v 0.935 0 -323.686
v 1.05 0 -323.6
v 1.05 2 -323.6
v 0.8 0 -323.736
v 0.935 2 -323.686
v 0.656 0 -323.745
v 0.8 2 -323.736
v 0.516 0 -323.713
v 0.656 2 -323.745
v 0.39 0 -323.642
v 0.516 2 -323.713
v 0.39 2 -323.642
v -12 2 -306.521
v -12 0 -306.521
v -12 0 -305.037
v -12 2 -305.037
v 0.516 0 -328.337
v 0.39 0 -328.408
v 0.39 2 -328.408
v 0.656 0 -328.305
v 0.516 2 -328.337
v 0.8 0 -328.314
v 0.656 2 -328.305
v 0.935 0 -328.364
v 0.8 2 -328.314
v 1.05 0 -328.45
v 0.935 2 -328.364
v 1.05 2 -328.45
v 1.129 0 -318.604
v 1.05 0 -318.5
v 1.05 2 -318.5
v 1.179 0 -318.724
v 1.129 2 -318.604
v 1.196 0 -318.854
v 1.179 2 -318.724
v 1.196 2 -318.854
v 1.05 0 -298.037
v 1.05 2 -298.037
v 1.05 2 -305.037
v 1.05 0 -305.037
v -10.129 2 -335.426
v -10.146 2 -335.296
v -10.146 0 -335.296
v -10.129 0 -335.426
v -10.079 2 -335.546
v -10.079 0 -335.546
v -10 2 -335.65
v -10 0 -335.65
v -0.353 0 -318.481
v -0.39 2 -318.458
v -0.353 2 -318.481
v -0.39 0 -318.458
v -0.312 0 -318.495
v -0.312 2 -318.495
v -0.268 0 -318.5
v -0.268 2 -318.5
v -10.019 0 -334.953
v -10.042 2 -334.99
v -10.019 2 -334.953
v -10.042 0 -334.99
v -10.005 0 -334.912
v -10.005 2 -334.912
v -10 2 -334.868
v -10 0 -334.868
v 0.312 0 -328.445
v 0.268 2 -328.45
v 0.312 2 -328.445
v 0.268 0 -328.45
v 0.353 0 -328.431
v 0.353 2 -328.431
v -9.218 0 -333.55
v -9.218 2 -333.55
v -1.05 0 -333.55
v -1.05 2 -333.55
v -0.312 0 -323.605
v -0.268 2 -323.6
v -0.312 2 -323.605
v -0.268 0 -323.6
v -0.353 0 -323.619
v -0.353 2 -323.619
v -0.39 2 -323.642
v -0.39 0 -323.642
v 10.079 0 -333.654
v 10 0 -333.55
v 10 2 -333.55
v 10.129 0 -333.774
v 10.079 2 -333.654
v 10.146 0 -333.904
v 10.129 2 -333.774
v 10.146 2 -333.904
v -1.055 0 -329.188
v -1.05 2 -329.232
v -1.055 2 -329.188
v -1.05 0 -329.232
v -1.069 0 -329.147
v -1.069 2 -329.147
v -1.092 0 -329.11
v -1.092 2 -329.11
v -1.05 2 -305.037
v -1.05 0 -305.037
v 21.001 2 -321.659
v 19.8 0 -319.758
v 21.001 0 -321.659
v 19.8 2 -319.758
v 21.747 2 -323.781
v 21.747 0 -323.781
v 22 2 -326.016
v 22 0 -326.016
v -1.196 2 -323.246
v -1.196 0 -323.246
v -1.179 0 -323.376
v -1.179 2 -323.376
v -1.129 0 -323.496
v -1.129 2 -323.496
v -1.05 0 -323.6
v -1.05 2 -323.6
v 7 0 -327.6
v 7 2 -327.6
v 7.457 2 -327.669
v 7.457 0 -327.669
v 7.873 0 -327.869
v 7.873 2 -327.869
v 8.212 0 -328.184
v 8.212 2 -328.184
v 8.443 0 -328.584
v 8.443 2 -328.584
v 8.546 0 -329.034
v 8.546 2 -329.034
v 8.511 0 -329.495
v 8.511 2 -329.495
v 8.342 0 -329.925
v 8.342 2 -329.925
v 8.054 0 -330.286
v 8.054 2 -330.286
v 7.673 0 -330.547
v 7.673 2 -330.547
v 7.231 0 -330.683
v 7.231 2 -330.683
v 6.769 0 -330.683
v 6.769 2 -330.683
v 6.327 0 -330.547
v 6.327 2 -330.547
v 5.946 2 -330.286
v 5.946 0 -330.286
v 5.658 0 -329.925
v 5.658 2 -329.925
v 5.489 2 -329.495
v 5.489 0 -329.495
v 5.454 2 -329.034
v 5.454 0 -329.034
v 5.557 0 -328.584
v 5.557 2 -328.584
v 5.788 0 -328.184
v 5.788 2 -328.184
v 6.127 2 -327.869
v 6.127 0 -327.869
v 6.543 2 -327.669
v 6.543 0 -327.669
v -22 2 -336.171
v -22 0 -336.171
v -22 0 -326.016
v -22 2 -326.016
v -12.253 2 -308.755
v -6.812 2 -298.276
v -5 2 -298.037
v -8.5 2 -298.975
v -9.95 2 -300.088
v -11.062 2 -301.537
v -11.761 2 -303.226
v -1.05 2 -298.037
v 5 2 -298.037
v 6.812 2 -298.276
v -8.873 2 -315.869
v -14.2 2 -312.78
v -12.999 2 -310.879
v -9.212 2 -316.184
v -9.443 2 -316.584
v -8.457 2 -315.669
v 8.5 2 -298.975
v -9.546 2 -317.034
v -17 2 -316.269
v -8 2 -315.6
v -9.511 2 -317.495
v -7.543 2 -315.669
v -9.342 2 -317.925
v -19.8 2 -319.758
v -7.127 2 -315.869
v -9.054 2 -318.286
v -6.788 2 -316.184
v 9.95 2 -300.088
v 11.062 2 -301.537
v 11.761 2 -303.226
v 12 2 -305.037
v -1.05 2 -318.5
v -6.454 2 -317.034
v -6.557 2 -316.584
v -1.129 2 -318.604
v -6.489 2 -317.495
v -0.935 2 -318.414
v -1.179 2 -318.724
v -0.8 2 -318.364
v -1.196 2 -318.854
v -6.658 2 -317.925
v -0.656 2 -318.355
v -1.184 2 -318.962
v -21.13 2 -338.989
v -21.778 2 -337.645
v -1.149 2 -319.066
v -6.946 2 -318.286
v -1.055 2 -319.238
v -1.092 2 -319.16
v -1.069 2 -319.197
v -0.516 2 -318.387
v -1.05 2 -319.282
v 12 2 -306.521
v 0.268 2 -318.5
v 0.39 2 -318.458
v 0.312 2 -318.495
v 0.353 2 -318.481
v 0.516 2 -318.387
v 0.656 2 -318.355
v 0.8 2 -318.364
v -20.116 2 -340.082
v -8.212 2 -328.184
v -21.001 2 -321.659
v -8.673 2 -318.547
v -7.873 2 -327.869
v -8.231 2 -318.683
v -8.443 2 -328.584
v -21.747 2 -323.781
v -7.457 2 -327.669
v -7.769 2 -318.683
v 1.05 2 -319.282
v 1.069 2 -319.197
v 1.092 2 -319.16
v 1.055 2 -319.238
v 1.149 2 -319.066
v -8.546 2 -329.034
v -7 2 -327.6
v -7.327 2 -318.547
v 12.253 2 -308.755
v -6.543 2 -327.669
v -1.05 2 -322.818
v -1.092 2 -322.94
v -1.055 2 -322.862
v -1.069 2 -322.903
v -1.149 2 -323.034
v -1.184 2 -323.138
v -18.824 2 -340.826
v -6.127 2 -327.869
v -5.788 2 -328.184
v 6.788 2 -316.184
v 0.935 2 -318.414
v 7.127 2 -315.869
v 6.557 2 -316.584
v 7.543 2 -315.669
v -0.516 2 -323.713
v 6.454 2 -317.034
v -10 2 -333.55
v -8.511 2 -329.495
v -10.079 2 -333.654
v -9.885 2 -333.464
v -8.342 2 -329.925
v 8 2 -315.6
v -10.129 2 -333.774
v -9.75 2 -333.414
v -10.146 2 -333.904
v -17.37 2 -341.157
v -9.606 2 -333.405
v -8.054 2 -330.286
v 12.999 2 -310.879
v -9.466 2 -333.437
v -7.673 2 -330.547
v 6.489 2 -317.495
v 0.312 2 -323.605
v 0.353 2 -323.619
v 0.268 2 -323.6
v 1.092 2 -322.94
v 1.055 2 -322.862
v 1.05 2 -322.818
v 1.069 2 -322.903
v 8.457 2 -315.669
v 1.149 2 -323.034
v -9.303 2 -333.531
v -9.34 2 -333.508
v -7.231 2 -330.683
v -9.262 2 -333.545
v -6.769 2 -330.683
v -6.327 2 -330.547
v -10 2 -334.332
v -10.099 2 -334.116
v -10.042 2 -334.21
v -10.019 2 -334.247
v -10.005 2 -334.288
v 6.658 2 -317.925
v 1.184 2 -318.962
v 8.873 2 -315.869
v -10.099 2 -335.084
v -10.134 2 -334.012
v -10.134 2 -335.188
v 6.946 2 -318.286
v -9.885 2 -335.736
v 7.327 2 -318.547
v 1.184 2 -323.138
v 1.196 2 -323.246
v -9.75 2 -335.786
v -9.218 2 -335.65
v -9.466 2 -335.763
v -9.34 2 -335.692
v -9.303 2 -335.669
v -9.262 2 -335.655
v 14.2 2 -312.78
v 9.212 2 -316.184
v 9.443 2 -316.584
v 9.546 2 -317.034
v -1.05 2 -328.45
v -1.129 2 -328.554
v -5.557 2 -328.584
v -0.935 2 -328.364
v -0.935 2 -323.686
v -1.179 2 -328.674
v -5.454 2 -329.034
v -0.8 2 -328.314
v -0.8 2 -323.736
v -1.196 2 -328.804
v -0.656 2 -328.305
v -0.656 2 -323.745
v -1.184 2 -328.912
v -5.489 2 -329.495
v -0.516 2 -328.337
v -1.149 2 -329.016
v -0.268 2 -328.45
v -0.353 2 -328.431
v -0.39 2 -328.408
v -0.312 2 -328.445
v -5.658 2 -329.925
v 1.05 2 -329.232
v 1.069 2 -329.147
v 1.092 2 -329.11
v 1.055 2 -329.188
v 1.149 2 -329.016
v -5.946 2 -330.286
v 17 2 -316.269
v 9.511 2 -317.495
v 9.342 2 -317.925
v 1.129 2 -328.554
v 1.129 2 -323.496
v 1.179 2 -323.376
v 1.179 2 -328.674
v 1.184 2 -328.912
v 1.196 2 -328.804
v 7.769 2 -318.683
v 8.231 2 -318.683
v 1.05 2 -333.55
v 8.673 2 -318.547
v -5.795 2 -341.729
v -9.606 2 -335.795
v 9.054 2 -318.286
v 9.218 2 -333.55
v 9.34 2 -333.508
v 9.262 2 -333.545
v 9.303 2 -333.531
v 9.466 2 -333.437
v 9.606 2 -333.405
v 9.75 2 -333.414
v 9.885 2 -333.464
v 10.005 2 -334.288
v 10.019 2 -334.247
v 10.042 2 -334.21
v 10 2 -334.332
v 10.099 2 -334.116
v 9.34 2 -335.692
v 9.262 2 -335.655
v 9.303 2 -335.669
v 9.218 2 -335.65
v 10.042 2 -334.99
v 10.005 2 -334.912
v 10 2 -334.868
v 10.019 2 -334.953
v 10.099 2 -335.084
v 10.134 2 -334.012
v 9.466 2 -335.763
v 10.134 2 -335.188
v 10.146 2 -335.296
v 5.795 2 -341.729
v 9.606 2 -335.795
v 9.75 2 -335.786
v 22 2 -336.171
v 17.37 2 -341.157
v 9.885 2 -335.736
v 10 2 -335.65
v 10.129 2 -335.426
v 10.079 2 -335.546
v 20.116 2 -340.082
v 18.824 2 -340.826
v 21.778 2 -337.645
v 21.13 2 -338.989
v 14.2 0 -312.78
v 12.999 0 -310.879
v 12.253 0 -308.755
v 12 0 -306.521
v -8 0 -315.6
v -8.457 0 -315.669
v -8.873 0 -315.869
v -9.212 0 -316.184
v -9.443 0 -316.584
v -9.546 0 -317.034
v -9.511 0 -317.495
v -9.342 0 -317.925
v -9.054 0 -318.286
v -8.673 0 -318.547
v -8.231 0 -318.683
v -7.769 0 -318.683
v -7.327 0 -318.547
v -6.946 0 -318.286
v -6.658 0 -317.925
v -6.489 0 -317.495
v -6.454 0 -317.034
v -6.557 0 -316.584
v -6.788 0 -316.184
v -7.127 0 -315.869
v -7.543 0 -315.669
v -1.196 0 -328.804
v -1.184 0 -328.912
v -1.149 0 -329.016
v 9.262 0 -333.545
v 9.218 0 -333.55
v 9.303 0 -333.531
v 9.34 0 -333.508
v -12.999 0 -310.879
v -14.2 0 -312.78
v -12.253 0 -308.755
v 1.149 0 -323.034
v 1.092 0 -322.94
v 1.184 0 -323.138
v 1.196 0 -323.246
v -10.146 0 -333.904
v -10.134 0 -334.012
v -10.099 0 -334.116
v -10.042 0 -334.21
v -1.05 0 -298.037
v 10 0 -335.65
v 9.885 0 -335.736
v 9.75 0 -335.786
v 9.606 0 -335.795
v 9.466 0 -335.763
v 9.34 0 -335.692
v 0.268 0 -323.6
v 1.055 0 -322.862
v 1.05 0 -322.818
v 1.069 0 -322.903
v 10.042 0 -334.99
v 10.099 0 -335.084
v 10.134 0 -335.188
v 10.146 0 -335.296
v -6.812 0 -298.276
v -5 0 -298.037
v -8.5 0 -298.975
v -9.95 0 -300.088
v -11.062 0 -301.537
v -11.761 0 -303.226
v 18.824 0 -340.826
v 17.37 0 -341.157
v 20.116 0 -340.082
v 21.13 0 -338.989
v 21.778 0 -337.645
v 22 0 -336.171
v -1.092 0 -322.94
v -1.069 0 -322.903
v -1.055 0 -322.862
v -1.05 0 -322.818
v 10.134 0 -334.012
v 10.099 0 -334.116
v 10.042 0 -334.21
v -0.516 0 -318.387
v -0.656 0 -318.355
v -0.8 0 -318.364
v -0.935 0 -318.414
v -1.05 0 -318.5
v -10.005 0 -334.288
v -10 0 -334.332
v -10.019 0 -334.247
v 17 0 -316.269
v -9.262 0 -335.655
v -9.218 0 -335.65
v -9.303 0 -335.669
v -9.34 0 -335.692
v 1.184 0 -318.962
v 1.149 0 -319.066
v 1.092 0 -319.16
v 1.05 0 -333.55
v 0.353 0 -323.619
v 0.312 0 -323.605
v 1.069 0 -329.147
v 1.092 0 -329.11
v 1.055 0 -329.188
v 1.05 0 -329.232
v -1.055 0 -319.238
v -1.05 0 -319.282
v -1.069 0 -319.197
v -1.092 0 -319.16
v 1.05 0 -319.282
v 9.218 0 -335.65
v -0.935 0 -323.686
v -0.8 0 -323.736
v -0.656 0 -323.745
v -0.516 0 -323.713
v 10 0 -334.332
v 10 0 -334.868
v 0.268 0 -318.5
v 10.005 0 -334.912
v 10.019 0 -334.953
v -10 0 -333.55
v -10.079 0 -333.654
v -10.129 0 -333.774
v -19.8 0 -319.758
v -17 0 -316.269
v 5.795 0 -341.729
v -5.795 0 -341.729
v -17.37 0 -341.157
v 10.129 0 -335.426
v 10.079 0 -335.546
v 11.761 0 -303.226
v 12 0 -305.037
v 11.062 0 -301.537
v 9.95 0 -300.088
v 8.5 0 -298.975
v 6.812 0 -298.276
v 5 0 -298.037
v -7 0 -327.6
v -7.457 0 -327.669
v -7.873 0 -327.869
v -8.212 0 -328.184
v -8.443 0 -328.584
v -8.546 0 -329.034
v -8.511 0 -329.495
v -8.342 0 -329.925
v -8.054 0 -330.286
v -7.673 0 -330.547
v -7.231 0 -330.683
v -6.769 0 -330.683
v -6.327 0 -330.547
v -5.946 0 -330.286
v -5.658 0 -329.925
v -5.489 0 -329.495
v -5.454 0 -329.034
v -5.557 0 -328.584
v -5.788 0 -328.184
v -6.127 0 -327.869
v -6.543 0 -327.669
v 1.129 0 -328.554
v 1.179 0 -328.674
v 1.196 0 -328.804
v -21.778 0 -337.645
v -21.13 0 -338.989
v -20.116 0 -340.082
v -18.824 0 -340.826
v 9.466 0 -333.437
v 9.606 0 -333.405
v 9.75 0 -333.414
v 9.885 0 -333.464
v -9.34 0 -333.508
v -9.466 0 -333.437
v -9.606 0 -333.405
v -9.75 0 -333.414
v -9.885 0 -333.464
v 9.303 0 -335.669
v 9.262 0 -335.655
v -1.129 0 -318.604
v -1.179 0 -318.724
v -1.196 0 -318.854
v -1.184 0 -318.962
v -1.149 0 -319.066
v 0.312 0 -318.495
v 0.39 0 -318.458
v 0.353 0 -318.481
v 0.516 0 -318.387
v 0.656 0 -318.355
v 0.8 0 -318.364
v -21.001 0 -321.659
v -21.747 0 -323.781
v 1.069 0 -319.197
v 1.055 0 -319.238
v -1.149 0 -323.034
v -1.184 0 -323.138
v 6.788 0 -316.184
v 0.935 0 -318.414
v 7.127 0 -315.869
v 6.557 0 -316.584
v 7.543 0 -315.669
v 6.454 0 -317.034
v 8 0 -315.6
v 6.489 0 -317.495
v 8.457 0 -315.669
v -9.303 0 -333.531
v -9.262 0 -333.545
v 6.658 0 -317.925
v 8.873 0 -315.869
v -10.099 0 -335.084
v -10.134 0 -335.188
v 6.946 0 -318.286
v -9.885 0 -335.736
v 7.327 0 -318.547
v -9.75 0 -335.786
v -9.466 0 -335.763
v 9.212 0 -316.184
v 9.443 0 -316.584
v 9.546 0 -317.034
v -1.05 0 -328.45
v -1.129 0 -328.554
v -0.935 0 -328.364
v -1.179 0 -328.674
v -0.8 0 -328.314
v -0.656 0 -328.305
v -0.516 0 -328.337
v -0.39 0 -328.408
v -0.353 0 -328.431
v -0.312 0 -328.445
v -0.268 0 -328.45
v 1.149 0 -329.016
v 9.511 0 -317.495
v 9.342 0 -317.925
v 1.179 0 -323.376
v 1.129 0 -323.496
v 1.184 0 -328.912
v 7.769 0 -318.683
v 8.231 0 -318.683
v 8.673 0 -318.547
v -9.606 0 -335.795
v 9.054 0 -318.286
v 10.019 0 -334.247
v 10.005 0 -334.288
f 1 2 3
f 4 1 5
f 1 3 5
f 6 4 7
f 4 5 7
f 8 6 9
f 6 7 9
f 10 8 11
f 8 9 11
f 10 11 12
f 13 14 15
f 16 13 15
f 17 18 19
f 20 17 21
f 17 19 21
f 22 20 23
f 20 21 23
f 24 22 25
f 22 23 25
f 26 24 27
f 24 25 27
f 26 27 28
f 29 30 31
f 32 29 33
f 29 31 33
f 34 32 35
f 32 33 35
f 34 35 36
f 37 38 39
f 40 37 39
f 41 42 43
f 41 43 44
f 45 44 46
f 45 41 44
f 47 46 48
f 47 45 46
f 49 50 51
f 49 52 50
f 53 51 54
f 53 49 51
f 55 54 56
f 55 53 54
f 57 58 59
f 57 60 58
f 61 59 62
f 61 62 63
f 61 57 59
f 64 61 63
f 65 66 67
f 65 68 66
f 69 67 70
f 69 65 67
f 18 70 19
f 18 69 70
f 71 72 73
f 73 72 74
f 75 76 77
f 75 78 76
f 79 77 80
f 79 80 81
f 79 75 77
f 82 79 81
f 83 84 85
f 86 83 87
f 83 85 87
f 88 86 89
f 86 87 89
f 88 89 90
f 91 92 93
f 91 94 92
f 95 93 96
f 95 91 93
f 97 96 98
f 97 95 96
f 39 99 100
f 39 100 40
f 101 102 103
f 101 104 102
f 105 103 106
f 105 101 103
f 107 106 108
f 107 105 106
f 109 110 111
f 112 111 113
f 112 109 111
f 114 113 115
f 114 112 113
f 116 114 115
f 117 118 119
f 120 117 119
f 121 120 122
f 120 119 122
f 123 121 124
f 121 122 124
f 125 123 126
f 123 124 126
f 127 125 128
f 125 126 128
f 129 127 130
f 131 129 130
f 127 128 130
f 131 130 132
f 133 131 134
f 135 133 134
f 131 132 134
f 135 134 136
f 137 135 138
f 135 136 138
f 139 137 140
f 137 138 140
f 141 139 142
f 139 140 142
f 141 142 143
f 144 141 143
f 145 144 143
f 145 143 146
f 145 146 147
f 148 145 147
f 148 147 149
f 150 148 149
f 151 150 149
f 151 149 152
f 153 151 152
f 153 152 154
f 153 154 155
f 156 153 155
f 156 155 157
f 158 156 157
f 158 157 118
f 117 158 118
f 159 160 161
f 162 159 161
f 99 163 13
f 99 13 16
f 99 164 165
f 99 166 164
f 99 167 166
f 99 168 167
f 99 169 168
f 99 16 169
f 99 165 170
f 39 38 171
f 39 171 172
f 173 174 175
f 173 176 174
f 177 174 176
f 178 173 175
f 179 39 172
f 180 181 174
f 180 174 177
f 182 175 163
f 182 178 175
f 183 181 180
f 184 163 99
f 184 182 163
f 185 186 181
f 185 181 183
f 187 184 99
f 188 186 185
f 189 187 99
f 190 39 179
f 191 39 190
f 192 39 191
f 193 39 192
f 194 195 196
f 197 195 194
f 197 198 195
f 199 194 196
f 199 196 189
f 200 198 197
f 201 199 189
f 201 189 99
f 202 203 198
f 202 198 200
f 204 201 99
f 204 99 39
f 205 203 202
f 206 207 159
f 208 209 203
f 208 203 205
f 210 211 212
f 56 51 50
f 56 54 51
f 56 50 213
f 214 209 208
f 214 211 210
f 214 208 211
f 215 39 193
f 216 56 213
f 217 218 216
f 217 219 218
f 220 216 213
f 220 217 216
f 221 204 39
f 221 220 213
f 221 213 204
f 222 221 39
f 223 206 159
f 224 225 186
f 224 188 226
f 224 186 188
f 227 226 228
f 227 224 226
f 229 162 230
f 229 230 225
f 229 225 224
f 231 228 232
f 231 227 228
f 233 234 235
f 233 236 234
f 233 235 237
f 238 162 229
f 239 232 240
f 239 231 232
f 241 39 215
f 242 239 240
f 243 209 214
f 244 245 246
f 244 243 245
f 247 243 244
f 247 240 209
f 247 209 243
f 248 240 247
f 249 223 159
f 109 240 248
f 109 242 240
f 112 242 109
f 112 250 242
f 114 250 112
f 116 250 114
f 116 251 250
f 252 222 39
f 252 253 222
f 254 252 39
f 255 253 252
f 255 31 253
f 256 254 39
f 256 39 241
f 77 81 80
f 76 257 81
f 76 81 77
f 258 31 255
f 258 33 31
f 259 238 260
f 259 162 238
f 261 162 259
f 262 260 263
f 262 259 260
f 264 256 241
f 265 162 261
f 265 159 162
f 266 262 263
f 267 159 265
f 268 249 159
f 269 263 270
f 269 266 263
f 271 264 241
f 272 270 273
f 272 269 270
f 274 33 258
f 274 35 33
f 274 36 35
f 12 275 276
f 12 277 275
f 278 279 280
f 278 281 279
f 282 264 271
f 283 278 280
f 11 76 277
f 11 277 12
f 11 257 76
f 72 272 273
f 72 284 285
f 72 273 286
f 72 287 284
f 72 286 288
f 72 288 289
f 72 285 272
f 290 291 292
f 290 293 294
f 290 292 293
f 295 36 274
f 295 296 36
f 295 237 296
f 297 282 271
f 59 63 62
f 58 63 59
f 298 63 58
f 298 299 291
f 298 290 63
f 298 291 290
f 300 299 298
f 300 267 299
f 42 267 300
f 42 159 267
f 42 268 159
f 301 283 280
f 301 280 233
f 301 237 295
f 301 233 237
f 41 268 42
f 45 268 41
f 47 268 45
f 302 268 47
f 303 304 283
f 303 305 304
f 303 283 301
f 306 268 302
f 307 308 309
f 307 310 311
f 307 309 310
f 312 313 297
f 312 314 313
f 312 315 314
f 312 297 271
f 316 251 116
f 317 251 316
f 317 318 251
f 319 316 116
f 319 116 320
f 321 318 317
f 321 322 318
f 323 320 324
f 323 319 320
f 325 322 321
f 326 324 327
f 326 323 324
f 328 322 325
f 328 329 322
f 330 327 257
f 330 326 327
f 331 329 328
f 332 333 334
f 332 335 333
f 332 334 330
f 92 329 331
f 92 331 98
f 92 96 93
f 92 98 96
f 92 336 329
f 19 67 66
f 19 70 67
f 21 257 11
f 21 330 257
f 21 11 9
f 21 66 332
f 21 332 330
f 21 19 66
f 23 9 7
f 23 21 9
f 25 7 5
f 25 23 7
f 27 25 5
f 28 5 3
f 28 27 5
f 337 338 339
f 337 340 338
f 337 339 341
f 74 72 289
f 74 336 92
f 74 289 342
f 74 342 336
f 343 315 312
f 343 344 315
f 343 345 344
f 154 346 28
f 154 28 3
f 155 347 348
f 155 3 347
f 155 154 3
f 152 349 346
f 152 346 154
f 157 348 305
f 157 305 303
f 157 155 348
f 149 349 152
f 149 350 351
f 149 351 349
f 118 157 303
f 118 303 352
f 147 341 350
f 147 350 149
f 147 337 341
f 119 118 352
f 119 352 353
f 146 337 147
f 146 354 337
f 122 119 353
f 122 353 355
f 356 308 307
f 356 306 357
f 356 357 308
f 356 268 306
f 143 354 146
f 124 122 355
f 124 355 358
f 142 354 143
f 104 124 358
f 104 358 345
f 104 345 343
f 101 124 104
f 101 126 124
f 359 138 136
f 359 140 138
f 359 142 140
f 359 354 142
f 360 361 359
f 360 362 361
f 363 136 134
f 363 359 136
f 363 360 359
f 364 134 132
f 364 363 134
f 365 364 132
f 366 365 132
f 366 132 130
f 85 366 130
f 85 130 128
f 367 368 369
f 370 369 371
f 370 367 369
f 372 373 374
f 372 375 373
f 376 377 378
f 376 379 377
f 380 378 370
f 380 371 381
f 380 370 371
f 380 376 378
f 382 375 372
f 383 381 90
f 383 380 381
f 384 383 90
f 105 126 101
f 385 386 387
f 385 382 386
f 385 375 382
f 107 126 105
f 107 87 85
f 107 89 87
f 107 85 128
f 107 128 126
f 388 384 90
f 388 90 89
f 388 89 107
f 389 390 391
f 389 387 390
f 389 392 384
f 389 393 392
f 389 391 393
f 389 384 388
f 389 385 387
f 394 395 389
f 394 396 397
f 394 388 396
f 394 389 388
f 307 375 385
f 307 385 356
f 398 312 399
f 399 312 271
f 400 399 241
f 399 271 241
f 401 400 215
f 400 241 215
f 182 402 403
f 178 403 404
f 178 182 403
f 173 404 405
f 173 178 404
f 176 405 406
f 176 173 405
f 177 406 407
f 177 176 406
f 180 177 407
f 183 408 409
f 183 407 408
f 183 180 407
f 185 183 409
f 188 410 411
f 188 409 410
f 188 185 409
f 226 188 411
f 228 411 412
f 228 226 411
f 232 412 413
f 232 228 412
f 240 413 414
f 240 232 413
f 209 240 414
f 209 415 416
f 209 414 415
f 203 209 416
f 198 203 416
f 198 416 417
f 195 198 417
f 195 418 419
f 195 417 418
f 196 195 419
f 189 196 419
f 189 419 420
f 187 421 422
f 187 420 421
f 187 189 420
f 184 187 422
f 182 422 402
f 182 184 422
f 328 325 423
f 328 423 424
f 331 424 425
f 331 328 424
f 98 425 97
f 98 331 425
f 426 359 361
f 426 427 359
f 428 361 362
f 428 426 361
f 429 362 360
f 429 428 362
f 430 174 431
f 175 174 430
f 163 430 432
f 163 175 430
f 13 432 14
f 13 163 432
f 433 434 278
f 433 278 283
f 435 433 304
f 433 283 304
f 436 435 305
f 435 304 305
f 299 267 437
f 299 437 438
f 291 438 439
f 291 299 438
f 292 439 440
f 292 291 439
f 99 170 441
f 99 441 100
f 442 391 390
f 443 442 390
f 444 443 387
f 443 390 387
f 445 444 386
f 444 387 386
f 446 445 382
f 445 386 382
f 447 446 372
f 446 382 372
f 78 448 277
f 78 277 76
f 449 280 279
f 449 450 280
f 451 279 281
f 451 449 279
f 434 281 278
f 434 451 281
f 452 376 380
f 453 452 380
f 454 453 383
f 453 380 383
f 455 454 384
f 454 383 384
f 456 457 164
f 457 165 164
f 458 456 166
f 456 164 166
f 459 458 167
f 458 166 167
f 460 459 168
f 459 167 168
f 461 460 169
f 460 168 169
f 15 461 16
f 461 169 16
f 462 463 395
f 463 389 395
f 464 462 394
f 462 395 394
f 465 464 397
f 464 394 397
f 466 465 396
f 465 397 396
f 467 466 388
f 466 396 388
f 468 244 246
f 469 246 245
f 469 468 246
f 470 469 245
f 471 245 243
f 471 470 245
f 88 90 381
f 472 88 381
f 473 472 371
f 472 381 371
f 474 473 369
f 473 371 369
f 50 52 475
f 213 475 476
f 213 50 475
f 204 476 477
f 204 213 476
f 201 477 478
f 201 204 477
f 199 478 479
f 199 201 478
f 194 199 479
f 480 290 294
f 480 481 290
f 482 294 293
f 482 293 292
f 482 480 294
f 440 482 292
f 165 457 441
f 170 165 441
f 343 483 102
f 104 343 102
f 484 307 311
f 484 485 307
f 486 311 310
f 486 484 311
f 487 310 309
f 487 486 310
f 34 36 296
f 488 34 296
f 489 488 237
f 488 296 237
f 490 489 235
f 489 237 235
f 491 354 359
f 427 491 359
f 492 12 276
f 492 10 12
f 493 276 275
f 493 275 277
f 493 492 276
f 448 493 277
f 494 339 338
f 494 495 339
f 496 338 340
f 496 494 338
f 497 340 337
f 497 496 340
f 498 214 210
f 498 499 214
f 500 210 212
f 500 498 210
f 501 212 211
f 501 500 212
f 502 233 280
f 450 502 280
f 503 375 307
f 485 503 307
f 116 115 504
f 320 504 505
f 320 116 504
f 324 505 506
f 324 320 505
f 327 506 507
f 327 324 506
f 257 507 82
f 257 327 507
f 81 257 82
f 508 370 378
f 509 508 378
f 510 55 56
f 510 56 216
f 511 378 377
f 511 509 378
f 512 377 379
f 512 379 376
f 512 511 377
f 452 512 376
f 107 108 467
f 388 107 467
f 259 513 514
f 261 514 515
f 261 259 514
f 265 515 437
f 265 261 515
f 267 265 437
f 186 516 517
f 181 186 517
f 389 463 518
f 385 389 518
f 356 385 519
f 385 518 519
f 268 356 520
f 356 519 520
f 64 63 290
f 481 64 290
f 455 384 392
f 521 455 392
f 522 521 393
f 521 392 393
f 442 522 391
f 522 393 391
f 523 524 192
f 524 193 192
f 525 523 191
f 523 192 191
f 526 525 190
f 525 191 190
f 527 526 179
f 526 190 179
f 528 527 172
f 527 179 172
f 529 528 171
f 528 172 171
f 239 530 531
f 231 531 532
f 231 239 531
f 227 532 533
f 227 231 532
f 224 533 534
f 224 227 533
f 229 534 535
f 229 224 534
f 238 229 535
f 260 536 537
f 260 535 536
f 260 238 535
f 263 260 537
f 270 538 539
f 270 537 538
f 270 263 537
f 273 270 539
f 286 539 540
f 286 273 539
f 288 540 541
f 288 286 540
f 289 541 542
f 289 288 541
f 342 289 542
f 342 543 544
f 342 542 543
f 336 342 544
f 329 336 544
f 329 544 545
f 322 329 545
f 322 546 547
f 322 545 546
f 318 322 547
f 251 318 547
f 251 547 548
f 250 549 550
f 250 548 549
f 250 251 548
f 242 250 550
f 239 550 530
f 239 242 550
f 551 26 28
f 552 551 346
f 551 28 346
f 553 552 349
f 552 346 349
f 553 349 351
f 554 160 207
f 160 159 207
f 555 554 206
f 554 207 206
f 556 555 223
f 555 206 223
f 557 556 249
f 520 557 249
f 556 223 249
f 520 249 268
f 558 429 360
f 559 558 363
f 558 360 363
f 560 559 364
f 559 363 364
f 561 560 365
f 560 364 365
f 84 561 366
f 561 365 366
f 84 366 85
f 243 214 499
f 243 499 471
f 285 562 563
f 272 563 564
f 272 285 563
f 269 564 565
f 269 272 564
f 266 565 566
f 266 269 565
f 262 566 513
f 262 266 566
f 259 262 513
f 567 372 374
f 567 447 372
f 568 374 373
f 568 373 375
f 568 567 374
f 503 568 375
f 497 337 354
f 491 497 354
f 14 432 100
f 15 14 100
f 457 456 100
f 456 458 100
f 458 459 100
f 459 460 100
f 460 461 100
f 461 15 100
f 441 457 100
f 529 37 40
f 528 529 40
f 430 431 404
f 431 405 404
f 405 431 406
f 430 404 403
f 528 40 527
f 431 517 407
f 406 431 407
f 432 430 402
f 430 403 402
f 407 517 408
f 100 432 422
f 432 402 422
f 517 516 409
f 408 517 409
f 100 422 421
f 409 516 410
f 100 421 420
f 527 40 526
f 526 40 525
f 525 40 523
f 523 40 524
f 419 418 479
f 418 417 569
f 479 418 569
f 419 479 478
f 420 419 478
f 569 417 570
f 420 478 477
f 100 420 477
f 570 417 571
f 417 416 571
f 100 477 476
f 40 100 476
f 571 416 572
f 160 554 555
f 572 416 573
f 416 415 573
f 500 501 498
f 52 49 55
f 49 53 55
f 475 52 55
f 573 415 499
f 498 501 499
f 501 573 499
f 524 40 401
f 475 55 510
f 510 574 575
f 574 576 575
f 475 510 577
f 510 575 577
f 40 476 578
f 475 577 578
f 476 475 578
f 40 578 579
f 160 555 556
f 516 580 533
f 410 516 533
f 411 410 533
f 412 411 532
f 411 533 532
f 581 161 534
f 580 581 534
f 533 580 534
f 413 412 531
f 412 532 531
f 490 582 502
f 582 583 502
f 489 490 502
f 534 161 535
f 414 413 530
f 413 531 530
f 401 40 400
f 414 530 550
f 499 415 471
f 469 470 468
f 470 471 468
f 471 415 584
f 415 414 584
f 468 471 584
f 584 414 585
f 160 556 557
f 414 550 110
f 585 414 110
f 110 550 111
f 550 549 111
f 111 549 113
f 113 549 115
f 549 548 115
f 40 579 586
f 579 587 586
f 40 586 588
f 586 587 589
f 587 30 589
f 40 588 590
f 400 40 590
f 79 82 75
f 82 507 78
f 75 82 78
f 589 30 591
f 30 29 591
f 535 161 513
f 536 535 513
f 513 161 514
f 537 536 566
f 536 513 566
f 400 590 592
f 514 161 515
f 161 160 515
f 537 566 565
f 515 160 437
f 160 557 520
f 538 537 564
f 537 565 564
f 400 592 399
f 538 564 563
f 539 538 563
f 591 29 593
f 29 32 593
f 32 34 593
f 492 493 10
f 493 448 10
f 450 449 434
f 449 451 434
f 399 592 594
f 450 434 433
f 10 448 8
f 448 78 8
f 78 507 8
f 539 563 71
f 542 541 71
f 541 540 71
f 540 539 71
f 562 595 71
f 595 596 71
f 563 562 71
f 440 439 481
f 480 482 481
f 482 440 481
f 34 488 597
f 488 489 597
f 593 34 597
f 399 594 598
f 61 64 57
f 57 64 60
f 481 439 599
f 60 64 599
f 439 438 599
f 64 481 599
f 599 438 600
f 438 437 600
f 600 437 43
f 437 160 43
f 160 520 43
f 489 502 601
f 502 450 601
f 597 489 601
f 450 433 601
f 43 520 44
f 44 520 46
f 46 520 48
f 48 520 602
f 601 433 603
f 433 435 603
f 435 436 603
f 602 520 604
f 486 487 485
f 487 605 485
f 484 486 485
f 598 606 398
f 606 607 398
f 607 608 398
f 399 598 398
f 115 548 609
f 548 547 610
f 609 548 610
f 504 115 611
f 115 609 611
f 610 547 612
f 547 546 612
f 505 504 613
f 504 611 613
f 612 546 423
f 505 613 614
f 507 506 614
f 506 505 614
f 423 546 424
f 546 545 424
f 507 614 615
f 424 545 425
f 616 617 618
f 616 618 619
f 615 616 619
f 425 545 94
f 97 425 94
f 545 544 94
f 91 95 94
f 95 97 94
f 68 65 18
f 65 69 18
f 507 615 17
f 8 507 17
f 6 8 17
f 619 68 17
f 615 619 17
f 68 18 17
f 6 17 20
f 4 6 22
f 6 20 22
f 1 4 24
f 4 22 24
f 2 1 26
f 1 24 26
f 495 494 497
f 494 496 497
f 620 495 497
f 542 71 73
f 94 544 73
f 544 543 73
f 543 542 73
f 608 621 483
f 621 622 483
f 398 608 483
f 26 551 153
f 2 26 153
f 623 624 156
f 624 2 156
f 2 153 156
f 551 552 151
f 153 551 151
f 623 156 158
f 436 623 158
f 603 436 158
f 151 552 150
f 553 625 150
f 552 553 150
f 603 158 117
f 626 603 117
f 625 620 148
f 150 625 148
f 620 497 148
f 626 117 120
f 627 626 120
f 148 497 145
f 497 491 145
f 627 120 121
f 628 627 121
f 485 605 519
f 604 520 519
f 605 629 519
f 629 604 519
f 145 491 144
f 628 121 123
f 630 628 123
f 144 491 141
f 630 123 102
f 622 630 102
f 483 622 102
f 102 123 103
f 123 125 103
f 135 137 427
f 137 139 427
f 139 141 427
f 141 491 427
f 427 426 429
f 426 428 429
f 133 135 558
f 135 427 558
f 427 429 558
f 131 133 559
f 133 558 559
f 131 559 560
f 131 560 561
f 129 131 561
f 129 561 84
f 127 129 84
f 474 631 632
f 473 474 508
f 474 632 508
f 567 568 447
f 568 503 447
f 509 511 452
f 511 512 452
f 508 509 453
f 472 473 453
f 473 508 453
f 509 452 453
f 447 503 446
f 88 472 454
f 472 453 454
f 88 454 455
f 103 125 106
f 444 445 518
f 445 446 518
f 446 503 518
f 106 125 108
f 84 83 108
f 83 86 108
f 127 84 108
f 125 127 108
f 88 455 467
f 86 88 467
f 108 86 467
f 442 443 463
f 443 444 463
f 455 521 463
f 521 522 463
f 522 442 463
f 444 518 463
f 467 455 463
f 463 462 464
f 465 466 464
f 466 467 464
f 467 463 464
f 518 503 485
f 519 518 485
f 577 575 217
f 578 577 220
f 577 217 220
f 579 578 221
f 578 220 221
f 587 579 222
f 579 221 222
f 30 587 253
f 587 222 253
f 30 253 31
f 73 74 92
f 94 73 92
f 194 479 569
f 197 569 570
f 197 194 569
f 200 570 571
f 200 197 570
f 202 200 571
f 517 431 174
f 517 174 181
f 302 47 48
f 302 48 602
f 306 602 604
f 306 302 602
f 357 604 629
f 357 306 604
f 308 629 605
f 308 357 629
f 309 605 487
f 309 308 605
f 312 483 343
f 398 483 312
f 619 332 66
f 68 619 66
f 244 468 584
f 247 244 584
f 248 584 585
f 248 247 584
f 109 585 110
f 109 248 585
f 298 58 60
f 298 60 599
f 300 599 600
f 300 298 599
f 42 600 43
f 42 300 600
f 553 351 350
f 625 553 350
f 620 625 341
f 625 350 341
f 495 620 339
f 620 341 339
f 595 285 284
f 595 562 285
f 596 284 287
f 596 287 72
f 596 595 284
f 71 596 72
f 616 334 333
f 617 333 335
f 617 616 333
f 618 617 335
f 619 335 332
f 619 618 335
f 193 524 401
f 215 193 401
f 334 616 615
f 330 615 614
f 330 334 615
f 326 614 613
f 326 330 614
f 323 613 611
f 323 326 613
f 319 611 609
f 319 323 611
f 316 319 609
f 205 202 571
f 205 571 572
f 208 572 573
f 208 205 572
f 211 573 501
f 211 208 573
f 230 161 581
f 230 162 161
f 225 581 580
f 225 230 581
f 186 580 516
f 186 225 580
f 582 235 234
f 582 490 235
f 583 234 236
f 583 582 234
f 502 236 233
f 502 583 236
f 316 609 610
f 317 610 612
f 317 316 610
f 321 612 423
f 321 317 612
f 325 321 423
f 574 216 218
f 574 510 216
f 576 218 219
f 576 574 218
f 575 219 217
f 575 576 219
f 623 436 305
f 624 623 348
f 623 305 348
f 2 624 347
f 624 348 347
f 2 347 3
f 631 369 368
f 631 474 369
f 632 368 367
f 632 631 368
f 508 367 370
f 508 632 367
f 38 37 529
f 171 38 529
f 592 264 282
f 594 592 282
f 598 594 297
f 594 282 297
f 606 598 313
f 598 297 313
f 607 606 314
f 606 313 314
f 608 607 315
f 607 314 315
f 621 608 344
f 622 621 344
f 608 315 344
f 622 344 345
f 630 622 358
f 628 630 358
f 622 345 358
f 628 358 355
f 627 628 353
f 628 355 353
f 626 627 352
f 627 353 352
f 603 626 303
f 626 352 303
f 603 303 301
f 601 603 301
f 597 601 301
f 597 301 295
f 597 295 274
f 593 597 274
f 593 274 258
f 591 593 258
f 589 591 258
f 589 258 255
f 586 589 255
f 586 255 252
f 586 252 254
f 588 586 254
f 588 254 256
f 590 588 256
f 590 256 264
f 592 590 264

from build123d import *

# Parameters (mm, degrees)
EXTRUDE_1_DEPTH     = 2
SKETCH_2_W          = 1.05
SKETCH_2_H          = 5.1
CUT_EXTRUDE_1_DEPTH = 343.513123836
CUT_EXTRUDE_2_DEPTH = 343.513123836
FILLET_1_R          = 0.2
SKETCH_4_R          = 1.55
CUT_EXTRUDE_3_DEPTH = 343.513123836
FILLET_2_R          = 5
EXTRUDE_START       = -2
EXTRUDE_2_DEPTH     = 2
CUT_EXTRUDE_START   = -10
CUT_EXTRUDE_5_DEPTH = 10
SKETCH_6_W          = 2.1
SKETCH_6_H          = 7
CUT_EXTRUDE_4_DEPTH = 2
FILLET_8_R          = 7
FILLET_5_R          = 10
FILLET_6_R          = 10


with BuildPart() as part:
    # 草图1 → 凸台-拉伸1 (new body)
    with BuildSketch(Plane(origin=(0, 0, 0), x_dir=(1, 0, 0), z_dir=(0, 1, 0))):
        with BuildLine():
            Line((-22, 322.5), (-17, 320.227272727))
            Line((-17, 320.227272727), (-17, 312.037257391))
            ThreePointArc((-17, 312.037257391), (0, 312.5), (17, 312.037257391))
            Line((17, 312.037257391), (17, 320.227272727))
            Line((17, 320.227272727), (22, 322.5))
            Line((22, 322.5), (22, 340.767946523))
            ThreePointArc((22, 340.767946523), (0, 341.8), (-22, 340.767946523))
            Line((-22, 340.767946523), (-22, 322.5))
        make_face()
    extrude(amount=EXTRUDE_1_DEPTH)

    # 草图2 → 切除-拉伸1 (cut, through all)
    with BuildSketch(Plane(origin=(0, 2, 0), x_dir=(1, 0, 0), z_dir=(0, 1, 0))):
        Polygon((0, 335.65), (0, 328.45), (1.05, 328.45), (1.05, 333.55), (10, 333.55), (10, 335.65), align=None)
        Polygon((-1.05, 328.45), (0, 328.45), (0, 335.65), (-10, 335.65), (-10, 333.55), (-1.05, 333.55), align=None)
        with Locations((0.525, 321.05)):
            Rectangle(SKETCH_2_W, SKETCH_2_H)
        with Locations((-0.525, 321.05)):
            Rectangle(SKETCH_2_W, SKETCH_2_H)
    extrude(amount=-CUT_EXTRUDE_1_DEPTH, mode=Mode.SUBTRACT)

    # 草图3 → 切除-拉伸2 (cut, through all)
    with BuildSketch(Plane(origin=(0, 2, 0), x_dir=(1, 0, 0), z_dir=(0, 1, 0))):
        with BuildLine():
            Line((10, 335.65), (10, 334.942893219))
            ThreePointArc((10, 334.942893219), (10.108386376, 335.105104893), (10.146446609, 335.296446609))
            ThreePointArc((10.146446609, 335.296446609), (10.108386376, 335.487788326), (10, 335.65))
        make_face()
        with BuildLine():
            ThreePointArc((10, 335.65), (9.646446609, 335.796446609), (9.292893219, 335.65))
            Line((9.292893219, 335.65), (10, 335.65))
        make_face()
        with BuildLine():
            ThreePointArc((10.146446609, 333.903553391), (10.108386376, 334.094895107), (10, 334.257106781))
            Line((10, 334.257106781), (10, 333.55))
            ThreePointArc((10, 333.55), (10.108386376, 333.712211674), (10.146446609, 333.903553391))
        make_face()
        with BuildLine():
            Line((10, 333.55), (9.292893219, 333.55))
            ThreePointArc((9.292893219, 333.55), (9.646446609, 333.403553391), (10, 333.55))
        make_face()
        with BuildLine():
            ThreePointArc((1.196446609, 328.803553391), (1.158386376, 328.994895107), (1.05, 329.157106781))
            Line((1.05, 329.157106781), (1.05, 328.45))
            ThreePointArc((1.05, 328.45), (1.158386376, 328.612211674), (1.196446609, 328.803553391))
        make_face()
        with BuildLine():
            Line((1.05, 328.45), (0.342893219, 328.45))
            ThreePointArc((0.342893219, 328.45), (0.696446609, 328.303553391), (1.05, 328.45))
        make_face()
        with BuildLine():
            ThreePointArc((1.196446609, 323.246446609), (1.158386376, 323.437788326), (1.05, 323.6))
            Line((1.05, 323.6), (1.05, 322.892893219))
            ThreePointArc((1.05, 322.892893219), (1.158386376, 323.055104893), (1.196446609, 323.246446609))
        make_face()
        with BuildLine():
            ThreePointArc((1.05, 323.6), (0.696446609, 323.746446609), (0.342893219, 323.6))
            Line((0.342893219, 323.6), (1.05, 323.6))
        make_face()
        with BuildLine():
            ThreePointArc((1.196446609, 318.853553391), (1.158386376, 319.044895107), (1.05, 319.207106781))
            Line((1.05, 319.207106781), (1.05, 318.5))
            ThreePointArc((1.05, 318.5), (1.158386376, 318.662211674), (1.196446609, 318.853553391))
        make_face()
        with BuildLine():
            Line((1.05, 318.5), (0.342893219, 318.5))
            ThreePointArc((0.342893219, 318.5), (0.696446609, 318.353553391), (1.05, 318.5))
        make_face()
    cut_extrude_2 = extrude(amount=-CUT_EXTRUDE_2_DEPTH, mode=Mode.SUBTRACT)

    # 镜向1: 切除-拉伸2 across plane
    add(cut_extrude_2.mirror(Plane(origin=(0, 0, 0), x_dir=(0, 0, 1), z_dir=(1, 0, 0))), mode=Mode.SUBTRACT)

    # 圆角1
    fillet_1_edges = [part.edges().sort_by_distance(p)[0] for p in [
        (1.05, 1, -329.157106781),
        (0.342893219, 1, -323.6),
        (1.05, 1, -319.207106781),
        (9.292893219, 1, -335.65),
        (10, 1, -334.257106781),
        (0.342893219, 1, -328.45),
        (1.05, 1, -322.892893219),
        (0.342893219, 1, -318.5),
        (-10, 1, -334.942893219),
        (-9.292893219, 1, -333.55),
        (-1.05, 1, -329.157106781),
        (-0.342893219, 1, -323.6),
        (-1.05, 1, -319.207106781),
        (-9.292893219, 1, -335.65),
        (-10, 1, -334.257106781),
        (-0.342893219, 1, -328.45),
        (-1.05, 1, -322.892893219),
        (-0.342893219, 1, -318.5),
        (10, 1, -334.942893219),
        (9.292893219, 1, -333.55),
    ]]
    fillet(fillet_1_edges, radius=FILLET_1_R)

    # 草图4 → 切除-拉伸3 (cut, through all)
    with BuildSketch(Plane(origin=(0, 2, 0), x_dir=(1, 0, 0), z_dir=(0, 1, 0))):
        with Locations(Location((7, 329.15, 0), (0, 0, 270))):
            Circle(SKETCH_4_R)
        with Locations(Location((8, 317.15, 0), (0, 0, 270))):
            Circle(SKETCH_4_R)
    cut_extrude_3 = extrude(amount=-CUT_EXTRUDE_3_DEPTH, mode=Mode.SUBTRACT)

    # 镜向2: 切除-拉伸3 across plane
    add(cut_extrude_3.mirror(Plane(origin=(0, 0, 0), x_dir=(0, 0, 1), z_dir=(1, 0, 0))), mode=Mode.SUBTRACT)

    # 圆角2
    fillet_2_edges = [part.edges().sort_by_distance(p)[0] for p in [
        (-22, 1, -340.767946523),
        (22, 1, -340.767946523),
    ]]
    fillet(fillet_2_edges, radius=FILLET_2_R)

    # 草图5 → 凸台-拉伸2 (add)
    with BuildSketch(Plane(origin=(0, 2, 0), x_dir=(1, 0, 0), z_dir=(0, 1, 0)).offset(EXTRUDE_START)):
        with BuildLine():
            Line((-13.733814581, 312.198065877), (-12, 310.037257391))
            Line((-12, 310.037257391), (-12, 298.037257391))
            Line((-12, 298.037257391), (12, 298.037257391))
            Line((12, 298.037257391), (12, 310.037257391))
            Line((12, 310.037257391), (13.733814581, 312.198065877))
            ThreePointArc((13.733814581, 312.198065877), (0, 312.5), (-13.733814581, 312.198065877))
        make_face()
        Polygon((-22, 322.5), (-17, 316.268628695), (-17, 320.227272727), align=None)
        Polygon((17, 316.268628695), (22, 322.5), (17, 320.227272727), align=None)
    extrude(amount=EXTRUDE_2_DEPTH)

    # 草图5<3> → 切除-拉伸5 (cut)
    with BuildSketch(Plane(origin=(0, 2, 0), x_dir=(1, 0, 0), z_dir=(0, 1, 0)).offset(CUT_EXTRUDE_START)):
        with BuildLine():
            Line((-17, 310.037257391), (-17, 312.037257391))
            ThreePointArc((-17, 312.037257391), (-15.367117639, 312.121934019), (-13.733814581, 312.198065877))
            Line((-13.733814581, 312.198065877), (-22, 322.5))
            Line((-22, 322.5), (-22, 310.037257391))
            Line((-22, 310.037257391), (-17, 310.037257391))
        make_face()
        with BuildLine():
            ThreePointArc((-13.733814581, 312.198065877), (-15.367117639, 312.121934019), (-17, 312.037257391))
            Line((-17, 312.037257391), (-17, 310.037257391))
            Line((-17, 310.037257391), (-12, 310.037257391))
            Line((-12, 310.037257391), (-13.733814581, 312.198065877))
        make_face()
        with BuildLine():
            Line((22, 322.5), (13.733814581, 312.198065877))
            ThreePointArc((13.733814581, 312.198065877), (15.367117639, 312.121934019), (17, 312.037257391))
            Line((17, 312.037257391), (17, 310.037257391))
            Line((17, 310.037257391), (22, 310.037257391))
            Line((22, 310.037257391), (22, 322.5))
        make_face()
        with BuildLine():
            Line((13.733814581, 312.198065877), (12, 310.037257391))
            Line((12, 310.037257391), (17, 310.037257391))
            Line((17, 310.037257391), (17, 312.037257391))
            ThreePointArc((17, 312.037257391), (15.367117639, 312.121934019), (13.733814581, 312.198065877))
        make_face()
    extrude(amount=CUT_EXTRUDE_5_DEPTH, mode=Mode.SUBTRACT)

    # 草图6 → 切除-拉伸4 (cut)
    with BuildSketch(Plane(origin=(0, 2, 0), x_dir=(1, 0, 0), z_dir=(0, 1, 0))):
        with Locations((0, 301.537257391)):
            Rectangle(SKETCH_6_W, SKETCH_6_H)
    extrude(amount=-CUT_EXTRUDE_4_DEPTH, mode=Mode.SUBTRACT)

    # 圆角8
    fillet_8_edges = [part.edges().sort_by_distance(p)[0] for p in [
        (12, 1, -298.037257391),
        (-12, 1, -298.037257391),
    ]]
    fillet(fillet_8_edges, radius=FILLET_8_R)

    # 圆角5
    fillet_5_edges = [part.edges().sort_by_distance(p)[0] for p in [
        (22, 1, -322.5),
        (-22, 1, -322.5),
    ]]
    fillet(fillet_5_edges, radius=FILLET_5_R)

    # 圆角6
    fillet_6_edges = [part.edges().sort_by_distance(p)[0] for p in [
        (12, 1, -310.037257391),
        (-12, 1, -310.037257391),
    ]]
    fillet(fillet_6_edges, radius=FILLET_6_R)


solid = part.part
